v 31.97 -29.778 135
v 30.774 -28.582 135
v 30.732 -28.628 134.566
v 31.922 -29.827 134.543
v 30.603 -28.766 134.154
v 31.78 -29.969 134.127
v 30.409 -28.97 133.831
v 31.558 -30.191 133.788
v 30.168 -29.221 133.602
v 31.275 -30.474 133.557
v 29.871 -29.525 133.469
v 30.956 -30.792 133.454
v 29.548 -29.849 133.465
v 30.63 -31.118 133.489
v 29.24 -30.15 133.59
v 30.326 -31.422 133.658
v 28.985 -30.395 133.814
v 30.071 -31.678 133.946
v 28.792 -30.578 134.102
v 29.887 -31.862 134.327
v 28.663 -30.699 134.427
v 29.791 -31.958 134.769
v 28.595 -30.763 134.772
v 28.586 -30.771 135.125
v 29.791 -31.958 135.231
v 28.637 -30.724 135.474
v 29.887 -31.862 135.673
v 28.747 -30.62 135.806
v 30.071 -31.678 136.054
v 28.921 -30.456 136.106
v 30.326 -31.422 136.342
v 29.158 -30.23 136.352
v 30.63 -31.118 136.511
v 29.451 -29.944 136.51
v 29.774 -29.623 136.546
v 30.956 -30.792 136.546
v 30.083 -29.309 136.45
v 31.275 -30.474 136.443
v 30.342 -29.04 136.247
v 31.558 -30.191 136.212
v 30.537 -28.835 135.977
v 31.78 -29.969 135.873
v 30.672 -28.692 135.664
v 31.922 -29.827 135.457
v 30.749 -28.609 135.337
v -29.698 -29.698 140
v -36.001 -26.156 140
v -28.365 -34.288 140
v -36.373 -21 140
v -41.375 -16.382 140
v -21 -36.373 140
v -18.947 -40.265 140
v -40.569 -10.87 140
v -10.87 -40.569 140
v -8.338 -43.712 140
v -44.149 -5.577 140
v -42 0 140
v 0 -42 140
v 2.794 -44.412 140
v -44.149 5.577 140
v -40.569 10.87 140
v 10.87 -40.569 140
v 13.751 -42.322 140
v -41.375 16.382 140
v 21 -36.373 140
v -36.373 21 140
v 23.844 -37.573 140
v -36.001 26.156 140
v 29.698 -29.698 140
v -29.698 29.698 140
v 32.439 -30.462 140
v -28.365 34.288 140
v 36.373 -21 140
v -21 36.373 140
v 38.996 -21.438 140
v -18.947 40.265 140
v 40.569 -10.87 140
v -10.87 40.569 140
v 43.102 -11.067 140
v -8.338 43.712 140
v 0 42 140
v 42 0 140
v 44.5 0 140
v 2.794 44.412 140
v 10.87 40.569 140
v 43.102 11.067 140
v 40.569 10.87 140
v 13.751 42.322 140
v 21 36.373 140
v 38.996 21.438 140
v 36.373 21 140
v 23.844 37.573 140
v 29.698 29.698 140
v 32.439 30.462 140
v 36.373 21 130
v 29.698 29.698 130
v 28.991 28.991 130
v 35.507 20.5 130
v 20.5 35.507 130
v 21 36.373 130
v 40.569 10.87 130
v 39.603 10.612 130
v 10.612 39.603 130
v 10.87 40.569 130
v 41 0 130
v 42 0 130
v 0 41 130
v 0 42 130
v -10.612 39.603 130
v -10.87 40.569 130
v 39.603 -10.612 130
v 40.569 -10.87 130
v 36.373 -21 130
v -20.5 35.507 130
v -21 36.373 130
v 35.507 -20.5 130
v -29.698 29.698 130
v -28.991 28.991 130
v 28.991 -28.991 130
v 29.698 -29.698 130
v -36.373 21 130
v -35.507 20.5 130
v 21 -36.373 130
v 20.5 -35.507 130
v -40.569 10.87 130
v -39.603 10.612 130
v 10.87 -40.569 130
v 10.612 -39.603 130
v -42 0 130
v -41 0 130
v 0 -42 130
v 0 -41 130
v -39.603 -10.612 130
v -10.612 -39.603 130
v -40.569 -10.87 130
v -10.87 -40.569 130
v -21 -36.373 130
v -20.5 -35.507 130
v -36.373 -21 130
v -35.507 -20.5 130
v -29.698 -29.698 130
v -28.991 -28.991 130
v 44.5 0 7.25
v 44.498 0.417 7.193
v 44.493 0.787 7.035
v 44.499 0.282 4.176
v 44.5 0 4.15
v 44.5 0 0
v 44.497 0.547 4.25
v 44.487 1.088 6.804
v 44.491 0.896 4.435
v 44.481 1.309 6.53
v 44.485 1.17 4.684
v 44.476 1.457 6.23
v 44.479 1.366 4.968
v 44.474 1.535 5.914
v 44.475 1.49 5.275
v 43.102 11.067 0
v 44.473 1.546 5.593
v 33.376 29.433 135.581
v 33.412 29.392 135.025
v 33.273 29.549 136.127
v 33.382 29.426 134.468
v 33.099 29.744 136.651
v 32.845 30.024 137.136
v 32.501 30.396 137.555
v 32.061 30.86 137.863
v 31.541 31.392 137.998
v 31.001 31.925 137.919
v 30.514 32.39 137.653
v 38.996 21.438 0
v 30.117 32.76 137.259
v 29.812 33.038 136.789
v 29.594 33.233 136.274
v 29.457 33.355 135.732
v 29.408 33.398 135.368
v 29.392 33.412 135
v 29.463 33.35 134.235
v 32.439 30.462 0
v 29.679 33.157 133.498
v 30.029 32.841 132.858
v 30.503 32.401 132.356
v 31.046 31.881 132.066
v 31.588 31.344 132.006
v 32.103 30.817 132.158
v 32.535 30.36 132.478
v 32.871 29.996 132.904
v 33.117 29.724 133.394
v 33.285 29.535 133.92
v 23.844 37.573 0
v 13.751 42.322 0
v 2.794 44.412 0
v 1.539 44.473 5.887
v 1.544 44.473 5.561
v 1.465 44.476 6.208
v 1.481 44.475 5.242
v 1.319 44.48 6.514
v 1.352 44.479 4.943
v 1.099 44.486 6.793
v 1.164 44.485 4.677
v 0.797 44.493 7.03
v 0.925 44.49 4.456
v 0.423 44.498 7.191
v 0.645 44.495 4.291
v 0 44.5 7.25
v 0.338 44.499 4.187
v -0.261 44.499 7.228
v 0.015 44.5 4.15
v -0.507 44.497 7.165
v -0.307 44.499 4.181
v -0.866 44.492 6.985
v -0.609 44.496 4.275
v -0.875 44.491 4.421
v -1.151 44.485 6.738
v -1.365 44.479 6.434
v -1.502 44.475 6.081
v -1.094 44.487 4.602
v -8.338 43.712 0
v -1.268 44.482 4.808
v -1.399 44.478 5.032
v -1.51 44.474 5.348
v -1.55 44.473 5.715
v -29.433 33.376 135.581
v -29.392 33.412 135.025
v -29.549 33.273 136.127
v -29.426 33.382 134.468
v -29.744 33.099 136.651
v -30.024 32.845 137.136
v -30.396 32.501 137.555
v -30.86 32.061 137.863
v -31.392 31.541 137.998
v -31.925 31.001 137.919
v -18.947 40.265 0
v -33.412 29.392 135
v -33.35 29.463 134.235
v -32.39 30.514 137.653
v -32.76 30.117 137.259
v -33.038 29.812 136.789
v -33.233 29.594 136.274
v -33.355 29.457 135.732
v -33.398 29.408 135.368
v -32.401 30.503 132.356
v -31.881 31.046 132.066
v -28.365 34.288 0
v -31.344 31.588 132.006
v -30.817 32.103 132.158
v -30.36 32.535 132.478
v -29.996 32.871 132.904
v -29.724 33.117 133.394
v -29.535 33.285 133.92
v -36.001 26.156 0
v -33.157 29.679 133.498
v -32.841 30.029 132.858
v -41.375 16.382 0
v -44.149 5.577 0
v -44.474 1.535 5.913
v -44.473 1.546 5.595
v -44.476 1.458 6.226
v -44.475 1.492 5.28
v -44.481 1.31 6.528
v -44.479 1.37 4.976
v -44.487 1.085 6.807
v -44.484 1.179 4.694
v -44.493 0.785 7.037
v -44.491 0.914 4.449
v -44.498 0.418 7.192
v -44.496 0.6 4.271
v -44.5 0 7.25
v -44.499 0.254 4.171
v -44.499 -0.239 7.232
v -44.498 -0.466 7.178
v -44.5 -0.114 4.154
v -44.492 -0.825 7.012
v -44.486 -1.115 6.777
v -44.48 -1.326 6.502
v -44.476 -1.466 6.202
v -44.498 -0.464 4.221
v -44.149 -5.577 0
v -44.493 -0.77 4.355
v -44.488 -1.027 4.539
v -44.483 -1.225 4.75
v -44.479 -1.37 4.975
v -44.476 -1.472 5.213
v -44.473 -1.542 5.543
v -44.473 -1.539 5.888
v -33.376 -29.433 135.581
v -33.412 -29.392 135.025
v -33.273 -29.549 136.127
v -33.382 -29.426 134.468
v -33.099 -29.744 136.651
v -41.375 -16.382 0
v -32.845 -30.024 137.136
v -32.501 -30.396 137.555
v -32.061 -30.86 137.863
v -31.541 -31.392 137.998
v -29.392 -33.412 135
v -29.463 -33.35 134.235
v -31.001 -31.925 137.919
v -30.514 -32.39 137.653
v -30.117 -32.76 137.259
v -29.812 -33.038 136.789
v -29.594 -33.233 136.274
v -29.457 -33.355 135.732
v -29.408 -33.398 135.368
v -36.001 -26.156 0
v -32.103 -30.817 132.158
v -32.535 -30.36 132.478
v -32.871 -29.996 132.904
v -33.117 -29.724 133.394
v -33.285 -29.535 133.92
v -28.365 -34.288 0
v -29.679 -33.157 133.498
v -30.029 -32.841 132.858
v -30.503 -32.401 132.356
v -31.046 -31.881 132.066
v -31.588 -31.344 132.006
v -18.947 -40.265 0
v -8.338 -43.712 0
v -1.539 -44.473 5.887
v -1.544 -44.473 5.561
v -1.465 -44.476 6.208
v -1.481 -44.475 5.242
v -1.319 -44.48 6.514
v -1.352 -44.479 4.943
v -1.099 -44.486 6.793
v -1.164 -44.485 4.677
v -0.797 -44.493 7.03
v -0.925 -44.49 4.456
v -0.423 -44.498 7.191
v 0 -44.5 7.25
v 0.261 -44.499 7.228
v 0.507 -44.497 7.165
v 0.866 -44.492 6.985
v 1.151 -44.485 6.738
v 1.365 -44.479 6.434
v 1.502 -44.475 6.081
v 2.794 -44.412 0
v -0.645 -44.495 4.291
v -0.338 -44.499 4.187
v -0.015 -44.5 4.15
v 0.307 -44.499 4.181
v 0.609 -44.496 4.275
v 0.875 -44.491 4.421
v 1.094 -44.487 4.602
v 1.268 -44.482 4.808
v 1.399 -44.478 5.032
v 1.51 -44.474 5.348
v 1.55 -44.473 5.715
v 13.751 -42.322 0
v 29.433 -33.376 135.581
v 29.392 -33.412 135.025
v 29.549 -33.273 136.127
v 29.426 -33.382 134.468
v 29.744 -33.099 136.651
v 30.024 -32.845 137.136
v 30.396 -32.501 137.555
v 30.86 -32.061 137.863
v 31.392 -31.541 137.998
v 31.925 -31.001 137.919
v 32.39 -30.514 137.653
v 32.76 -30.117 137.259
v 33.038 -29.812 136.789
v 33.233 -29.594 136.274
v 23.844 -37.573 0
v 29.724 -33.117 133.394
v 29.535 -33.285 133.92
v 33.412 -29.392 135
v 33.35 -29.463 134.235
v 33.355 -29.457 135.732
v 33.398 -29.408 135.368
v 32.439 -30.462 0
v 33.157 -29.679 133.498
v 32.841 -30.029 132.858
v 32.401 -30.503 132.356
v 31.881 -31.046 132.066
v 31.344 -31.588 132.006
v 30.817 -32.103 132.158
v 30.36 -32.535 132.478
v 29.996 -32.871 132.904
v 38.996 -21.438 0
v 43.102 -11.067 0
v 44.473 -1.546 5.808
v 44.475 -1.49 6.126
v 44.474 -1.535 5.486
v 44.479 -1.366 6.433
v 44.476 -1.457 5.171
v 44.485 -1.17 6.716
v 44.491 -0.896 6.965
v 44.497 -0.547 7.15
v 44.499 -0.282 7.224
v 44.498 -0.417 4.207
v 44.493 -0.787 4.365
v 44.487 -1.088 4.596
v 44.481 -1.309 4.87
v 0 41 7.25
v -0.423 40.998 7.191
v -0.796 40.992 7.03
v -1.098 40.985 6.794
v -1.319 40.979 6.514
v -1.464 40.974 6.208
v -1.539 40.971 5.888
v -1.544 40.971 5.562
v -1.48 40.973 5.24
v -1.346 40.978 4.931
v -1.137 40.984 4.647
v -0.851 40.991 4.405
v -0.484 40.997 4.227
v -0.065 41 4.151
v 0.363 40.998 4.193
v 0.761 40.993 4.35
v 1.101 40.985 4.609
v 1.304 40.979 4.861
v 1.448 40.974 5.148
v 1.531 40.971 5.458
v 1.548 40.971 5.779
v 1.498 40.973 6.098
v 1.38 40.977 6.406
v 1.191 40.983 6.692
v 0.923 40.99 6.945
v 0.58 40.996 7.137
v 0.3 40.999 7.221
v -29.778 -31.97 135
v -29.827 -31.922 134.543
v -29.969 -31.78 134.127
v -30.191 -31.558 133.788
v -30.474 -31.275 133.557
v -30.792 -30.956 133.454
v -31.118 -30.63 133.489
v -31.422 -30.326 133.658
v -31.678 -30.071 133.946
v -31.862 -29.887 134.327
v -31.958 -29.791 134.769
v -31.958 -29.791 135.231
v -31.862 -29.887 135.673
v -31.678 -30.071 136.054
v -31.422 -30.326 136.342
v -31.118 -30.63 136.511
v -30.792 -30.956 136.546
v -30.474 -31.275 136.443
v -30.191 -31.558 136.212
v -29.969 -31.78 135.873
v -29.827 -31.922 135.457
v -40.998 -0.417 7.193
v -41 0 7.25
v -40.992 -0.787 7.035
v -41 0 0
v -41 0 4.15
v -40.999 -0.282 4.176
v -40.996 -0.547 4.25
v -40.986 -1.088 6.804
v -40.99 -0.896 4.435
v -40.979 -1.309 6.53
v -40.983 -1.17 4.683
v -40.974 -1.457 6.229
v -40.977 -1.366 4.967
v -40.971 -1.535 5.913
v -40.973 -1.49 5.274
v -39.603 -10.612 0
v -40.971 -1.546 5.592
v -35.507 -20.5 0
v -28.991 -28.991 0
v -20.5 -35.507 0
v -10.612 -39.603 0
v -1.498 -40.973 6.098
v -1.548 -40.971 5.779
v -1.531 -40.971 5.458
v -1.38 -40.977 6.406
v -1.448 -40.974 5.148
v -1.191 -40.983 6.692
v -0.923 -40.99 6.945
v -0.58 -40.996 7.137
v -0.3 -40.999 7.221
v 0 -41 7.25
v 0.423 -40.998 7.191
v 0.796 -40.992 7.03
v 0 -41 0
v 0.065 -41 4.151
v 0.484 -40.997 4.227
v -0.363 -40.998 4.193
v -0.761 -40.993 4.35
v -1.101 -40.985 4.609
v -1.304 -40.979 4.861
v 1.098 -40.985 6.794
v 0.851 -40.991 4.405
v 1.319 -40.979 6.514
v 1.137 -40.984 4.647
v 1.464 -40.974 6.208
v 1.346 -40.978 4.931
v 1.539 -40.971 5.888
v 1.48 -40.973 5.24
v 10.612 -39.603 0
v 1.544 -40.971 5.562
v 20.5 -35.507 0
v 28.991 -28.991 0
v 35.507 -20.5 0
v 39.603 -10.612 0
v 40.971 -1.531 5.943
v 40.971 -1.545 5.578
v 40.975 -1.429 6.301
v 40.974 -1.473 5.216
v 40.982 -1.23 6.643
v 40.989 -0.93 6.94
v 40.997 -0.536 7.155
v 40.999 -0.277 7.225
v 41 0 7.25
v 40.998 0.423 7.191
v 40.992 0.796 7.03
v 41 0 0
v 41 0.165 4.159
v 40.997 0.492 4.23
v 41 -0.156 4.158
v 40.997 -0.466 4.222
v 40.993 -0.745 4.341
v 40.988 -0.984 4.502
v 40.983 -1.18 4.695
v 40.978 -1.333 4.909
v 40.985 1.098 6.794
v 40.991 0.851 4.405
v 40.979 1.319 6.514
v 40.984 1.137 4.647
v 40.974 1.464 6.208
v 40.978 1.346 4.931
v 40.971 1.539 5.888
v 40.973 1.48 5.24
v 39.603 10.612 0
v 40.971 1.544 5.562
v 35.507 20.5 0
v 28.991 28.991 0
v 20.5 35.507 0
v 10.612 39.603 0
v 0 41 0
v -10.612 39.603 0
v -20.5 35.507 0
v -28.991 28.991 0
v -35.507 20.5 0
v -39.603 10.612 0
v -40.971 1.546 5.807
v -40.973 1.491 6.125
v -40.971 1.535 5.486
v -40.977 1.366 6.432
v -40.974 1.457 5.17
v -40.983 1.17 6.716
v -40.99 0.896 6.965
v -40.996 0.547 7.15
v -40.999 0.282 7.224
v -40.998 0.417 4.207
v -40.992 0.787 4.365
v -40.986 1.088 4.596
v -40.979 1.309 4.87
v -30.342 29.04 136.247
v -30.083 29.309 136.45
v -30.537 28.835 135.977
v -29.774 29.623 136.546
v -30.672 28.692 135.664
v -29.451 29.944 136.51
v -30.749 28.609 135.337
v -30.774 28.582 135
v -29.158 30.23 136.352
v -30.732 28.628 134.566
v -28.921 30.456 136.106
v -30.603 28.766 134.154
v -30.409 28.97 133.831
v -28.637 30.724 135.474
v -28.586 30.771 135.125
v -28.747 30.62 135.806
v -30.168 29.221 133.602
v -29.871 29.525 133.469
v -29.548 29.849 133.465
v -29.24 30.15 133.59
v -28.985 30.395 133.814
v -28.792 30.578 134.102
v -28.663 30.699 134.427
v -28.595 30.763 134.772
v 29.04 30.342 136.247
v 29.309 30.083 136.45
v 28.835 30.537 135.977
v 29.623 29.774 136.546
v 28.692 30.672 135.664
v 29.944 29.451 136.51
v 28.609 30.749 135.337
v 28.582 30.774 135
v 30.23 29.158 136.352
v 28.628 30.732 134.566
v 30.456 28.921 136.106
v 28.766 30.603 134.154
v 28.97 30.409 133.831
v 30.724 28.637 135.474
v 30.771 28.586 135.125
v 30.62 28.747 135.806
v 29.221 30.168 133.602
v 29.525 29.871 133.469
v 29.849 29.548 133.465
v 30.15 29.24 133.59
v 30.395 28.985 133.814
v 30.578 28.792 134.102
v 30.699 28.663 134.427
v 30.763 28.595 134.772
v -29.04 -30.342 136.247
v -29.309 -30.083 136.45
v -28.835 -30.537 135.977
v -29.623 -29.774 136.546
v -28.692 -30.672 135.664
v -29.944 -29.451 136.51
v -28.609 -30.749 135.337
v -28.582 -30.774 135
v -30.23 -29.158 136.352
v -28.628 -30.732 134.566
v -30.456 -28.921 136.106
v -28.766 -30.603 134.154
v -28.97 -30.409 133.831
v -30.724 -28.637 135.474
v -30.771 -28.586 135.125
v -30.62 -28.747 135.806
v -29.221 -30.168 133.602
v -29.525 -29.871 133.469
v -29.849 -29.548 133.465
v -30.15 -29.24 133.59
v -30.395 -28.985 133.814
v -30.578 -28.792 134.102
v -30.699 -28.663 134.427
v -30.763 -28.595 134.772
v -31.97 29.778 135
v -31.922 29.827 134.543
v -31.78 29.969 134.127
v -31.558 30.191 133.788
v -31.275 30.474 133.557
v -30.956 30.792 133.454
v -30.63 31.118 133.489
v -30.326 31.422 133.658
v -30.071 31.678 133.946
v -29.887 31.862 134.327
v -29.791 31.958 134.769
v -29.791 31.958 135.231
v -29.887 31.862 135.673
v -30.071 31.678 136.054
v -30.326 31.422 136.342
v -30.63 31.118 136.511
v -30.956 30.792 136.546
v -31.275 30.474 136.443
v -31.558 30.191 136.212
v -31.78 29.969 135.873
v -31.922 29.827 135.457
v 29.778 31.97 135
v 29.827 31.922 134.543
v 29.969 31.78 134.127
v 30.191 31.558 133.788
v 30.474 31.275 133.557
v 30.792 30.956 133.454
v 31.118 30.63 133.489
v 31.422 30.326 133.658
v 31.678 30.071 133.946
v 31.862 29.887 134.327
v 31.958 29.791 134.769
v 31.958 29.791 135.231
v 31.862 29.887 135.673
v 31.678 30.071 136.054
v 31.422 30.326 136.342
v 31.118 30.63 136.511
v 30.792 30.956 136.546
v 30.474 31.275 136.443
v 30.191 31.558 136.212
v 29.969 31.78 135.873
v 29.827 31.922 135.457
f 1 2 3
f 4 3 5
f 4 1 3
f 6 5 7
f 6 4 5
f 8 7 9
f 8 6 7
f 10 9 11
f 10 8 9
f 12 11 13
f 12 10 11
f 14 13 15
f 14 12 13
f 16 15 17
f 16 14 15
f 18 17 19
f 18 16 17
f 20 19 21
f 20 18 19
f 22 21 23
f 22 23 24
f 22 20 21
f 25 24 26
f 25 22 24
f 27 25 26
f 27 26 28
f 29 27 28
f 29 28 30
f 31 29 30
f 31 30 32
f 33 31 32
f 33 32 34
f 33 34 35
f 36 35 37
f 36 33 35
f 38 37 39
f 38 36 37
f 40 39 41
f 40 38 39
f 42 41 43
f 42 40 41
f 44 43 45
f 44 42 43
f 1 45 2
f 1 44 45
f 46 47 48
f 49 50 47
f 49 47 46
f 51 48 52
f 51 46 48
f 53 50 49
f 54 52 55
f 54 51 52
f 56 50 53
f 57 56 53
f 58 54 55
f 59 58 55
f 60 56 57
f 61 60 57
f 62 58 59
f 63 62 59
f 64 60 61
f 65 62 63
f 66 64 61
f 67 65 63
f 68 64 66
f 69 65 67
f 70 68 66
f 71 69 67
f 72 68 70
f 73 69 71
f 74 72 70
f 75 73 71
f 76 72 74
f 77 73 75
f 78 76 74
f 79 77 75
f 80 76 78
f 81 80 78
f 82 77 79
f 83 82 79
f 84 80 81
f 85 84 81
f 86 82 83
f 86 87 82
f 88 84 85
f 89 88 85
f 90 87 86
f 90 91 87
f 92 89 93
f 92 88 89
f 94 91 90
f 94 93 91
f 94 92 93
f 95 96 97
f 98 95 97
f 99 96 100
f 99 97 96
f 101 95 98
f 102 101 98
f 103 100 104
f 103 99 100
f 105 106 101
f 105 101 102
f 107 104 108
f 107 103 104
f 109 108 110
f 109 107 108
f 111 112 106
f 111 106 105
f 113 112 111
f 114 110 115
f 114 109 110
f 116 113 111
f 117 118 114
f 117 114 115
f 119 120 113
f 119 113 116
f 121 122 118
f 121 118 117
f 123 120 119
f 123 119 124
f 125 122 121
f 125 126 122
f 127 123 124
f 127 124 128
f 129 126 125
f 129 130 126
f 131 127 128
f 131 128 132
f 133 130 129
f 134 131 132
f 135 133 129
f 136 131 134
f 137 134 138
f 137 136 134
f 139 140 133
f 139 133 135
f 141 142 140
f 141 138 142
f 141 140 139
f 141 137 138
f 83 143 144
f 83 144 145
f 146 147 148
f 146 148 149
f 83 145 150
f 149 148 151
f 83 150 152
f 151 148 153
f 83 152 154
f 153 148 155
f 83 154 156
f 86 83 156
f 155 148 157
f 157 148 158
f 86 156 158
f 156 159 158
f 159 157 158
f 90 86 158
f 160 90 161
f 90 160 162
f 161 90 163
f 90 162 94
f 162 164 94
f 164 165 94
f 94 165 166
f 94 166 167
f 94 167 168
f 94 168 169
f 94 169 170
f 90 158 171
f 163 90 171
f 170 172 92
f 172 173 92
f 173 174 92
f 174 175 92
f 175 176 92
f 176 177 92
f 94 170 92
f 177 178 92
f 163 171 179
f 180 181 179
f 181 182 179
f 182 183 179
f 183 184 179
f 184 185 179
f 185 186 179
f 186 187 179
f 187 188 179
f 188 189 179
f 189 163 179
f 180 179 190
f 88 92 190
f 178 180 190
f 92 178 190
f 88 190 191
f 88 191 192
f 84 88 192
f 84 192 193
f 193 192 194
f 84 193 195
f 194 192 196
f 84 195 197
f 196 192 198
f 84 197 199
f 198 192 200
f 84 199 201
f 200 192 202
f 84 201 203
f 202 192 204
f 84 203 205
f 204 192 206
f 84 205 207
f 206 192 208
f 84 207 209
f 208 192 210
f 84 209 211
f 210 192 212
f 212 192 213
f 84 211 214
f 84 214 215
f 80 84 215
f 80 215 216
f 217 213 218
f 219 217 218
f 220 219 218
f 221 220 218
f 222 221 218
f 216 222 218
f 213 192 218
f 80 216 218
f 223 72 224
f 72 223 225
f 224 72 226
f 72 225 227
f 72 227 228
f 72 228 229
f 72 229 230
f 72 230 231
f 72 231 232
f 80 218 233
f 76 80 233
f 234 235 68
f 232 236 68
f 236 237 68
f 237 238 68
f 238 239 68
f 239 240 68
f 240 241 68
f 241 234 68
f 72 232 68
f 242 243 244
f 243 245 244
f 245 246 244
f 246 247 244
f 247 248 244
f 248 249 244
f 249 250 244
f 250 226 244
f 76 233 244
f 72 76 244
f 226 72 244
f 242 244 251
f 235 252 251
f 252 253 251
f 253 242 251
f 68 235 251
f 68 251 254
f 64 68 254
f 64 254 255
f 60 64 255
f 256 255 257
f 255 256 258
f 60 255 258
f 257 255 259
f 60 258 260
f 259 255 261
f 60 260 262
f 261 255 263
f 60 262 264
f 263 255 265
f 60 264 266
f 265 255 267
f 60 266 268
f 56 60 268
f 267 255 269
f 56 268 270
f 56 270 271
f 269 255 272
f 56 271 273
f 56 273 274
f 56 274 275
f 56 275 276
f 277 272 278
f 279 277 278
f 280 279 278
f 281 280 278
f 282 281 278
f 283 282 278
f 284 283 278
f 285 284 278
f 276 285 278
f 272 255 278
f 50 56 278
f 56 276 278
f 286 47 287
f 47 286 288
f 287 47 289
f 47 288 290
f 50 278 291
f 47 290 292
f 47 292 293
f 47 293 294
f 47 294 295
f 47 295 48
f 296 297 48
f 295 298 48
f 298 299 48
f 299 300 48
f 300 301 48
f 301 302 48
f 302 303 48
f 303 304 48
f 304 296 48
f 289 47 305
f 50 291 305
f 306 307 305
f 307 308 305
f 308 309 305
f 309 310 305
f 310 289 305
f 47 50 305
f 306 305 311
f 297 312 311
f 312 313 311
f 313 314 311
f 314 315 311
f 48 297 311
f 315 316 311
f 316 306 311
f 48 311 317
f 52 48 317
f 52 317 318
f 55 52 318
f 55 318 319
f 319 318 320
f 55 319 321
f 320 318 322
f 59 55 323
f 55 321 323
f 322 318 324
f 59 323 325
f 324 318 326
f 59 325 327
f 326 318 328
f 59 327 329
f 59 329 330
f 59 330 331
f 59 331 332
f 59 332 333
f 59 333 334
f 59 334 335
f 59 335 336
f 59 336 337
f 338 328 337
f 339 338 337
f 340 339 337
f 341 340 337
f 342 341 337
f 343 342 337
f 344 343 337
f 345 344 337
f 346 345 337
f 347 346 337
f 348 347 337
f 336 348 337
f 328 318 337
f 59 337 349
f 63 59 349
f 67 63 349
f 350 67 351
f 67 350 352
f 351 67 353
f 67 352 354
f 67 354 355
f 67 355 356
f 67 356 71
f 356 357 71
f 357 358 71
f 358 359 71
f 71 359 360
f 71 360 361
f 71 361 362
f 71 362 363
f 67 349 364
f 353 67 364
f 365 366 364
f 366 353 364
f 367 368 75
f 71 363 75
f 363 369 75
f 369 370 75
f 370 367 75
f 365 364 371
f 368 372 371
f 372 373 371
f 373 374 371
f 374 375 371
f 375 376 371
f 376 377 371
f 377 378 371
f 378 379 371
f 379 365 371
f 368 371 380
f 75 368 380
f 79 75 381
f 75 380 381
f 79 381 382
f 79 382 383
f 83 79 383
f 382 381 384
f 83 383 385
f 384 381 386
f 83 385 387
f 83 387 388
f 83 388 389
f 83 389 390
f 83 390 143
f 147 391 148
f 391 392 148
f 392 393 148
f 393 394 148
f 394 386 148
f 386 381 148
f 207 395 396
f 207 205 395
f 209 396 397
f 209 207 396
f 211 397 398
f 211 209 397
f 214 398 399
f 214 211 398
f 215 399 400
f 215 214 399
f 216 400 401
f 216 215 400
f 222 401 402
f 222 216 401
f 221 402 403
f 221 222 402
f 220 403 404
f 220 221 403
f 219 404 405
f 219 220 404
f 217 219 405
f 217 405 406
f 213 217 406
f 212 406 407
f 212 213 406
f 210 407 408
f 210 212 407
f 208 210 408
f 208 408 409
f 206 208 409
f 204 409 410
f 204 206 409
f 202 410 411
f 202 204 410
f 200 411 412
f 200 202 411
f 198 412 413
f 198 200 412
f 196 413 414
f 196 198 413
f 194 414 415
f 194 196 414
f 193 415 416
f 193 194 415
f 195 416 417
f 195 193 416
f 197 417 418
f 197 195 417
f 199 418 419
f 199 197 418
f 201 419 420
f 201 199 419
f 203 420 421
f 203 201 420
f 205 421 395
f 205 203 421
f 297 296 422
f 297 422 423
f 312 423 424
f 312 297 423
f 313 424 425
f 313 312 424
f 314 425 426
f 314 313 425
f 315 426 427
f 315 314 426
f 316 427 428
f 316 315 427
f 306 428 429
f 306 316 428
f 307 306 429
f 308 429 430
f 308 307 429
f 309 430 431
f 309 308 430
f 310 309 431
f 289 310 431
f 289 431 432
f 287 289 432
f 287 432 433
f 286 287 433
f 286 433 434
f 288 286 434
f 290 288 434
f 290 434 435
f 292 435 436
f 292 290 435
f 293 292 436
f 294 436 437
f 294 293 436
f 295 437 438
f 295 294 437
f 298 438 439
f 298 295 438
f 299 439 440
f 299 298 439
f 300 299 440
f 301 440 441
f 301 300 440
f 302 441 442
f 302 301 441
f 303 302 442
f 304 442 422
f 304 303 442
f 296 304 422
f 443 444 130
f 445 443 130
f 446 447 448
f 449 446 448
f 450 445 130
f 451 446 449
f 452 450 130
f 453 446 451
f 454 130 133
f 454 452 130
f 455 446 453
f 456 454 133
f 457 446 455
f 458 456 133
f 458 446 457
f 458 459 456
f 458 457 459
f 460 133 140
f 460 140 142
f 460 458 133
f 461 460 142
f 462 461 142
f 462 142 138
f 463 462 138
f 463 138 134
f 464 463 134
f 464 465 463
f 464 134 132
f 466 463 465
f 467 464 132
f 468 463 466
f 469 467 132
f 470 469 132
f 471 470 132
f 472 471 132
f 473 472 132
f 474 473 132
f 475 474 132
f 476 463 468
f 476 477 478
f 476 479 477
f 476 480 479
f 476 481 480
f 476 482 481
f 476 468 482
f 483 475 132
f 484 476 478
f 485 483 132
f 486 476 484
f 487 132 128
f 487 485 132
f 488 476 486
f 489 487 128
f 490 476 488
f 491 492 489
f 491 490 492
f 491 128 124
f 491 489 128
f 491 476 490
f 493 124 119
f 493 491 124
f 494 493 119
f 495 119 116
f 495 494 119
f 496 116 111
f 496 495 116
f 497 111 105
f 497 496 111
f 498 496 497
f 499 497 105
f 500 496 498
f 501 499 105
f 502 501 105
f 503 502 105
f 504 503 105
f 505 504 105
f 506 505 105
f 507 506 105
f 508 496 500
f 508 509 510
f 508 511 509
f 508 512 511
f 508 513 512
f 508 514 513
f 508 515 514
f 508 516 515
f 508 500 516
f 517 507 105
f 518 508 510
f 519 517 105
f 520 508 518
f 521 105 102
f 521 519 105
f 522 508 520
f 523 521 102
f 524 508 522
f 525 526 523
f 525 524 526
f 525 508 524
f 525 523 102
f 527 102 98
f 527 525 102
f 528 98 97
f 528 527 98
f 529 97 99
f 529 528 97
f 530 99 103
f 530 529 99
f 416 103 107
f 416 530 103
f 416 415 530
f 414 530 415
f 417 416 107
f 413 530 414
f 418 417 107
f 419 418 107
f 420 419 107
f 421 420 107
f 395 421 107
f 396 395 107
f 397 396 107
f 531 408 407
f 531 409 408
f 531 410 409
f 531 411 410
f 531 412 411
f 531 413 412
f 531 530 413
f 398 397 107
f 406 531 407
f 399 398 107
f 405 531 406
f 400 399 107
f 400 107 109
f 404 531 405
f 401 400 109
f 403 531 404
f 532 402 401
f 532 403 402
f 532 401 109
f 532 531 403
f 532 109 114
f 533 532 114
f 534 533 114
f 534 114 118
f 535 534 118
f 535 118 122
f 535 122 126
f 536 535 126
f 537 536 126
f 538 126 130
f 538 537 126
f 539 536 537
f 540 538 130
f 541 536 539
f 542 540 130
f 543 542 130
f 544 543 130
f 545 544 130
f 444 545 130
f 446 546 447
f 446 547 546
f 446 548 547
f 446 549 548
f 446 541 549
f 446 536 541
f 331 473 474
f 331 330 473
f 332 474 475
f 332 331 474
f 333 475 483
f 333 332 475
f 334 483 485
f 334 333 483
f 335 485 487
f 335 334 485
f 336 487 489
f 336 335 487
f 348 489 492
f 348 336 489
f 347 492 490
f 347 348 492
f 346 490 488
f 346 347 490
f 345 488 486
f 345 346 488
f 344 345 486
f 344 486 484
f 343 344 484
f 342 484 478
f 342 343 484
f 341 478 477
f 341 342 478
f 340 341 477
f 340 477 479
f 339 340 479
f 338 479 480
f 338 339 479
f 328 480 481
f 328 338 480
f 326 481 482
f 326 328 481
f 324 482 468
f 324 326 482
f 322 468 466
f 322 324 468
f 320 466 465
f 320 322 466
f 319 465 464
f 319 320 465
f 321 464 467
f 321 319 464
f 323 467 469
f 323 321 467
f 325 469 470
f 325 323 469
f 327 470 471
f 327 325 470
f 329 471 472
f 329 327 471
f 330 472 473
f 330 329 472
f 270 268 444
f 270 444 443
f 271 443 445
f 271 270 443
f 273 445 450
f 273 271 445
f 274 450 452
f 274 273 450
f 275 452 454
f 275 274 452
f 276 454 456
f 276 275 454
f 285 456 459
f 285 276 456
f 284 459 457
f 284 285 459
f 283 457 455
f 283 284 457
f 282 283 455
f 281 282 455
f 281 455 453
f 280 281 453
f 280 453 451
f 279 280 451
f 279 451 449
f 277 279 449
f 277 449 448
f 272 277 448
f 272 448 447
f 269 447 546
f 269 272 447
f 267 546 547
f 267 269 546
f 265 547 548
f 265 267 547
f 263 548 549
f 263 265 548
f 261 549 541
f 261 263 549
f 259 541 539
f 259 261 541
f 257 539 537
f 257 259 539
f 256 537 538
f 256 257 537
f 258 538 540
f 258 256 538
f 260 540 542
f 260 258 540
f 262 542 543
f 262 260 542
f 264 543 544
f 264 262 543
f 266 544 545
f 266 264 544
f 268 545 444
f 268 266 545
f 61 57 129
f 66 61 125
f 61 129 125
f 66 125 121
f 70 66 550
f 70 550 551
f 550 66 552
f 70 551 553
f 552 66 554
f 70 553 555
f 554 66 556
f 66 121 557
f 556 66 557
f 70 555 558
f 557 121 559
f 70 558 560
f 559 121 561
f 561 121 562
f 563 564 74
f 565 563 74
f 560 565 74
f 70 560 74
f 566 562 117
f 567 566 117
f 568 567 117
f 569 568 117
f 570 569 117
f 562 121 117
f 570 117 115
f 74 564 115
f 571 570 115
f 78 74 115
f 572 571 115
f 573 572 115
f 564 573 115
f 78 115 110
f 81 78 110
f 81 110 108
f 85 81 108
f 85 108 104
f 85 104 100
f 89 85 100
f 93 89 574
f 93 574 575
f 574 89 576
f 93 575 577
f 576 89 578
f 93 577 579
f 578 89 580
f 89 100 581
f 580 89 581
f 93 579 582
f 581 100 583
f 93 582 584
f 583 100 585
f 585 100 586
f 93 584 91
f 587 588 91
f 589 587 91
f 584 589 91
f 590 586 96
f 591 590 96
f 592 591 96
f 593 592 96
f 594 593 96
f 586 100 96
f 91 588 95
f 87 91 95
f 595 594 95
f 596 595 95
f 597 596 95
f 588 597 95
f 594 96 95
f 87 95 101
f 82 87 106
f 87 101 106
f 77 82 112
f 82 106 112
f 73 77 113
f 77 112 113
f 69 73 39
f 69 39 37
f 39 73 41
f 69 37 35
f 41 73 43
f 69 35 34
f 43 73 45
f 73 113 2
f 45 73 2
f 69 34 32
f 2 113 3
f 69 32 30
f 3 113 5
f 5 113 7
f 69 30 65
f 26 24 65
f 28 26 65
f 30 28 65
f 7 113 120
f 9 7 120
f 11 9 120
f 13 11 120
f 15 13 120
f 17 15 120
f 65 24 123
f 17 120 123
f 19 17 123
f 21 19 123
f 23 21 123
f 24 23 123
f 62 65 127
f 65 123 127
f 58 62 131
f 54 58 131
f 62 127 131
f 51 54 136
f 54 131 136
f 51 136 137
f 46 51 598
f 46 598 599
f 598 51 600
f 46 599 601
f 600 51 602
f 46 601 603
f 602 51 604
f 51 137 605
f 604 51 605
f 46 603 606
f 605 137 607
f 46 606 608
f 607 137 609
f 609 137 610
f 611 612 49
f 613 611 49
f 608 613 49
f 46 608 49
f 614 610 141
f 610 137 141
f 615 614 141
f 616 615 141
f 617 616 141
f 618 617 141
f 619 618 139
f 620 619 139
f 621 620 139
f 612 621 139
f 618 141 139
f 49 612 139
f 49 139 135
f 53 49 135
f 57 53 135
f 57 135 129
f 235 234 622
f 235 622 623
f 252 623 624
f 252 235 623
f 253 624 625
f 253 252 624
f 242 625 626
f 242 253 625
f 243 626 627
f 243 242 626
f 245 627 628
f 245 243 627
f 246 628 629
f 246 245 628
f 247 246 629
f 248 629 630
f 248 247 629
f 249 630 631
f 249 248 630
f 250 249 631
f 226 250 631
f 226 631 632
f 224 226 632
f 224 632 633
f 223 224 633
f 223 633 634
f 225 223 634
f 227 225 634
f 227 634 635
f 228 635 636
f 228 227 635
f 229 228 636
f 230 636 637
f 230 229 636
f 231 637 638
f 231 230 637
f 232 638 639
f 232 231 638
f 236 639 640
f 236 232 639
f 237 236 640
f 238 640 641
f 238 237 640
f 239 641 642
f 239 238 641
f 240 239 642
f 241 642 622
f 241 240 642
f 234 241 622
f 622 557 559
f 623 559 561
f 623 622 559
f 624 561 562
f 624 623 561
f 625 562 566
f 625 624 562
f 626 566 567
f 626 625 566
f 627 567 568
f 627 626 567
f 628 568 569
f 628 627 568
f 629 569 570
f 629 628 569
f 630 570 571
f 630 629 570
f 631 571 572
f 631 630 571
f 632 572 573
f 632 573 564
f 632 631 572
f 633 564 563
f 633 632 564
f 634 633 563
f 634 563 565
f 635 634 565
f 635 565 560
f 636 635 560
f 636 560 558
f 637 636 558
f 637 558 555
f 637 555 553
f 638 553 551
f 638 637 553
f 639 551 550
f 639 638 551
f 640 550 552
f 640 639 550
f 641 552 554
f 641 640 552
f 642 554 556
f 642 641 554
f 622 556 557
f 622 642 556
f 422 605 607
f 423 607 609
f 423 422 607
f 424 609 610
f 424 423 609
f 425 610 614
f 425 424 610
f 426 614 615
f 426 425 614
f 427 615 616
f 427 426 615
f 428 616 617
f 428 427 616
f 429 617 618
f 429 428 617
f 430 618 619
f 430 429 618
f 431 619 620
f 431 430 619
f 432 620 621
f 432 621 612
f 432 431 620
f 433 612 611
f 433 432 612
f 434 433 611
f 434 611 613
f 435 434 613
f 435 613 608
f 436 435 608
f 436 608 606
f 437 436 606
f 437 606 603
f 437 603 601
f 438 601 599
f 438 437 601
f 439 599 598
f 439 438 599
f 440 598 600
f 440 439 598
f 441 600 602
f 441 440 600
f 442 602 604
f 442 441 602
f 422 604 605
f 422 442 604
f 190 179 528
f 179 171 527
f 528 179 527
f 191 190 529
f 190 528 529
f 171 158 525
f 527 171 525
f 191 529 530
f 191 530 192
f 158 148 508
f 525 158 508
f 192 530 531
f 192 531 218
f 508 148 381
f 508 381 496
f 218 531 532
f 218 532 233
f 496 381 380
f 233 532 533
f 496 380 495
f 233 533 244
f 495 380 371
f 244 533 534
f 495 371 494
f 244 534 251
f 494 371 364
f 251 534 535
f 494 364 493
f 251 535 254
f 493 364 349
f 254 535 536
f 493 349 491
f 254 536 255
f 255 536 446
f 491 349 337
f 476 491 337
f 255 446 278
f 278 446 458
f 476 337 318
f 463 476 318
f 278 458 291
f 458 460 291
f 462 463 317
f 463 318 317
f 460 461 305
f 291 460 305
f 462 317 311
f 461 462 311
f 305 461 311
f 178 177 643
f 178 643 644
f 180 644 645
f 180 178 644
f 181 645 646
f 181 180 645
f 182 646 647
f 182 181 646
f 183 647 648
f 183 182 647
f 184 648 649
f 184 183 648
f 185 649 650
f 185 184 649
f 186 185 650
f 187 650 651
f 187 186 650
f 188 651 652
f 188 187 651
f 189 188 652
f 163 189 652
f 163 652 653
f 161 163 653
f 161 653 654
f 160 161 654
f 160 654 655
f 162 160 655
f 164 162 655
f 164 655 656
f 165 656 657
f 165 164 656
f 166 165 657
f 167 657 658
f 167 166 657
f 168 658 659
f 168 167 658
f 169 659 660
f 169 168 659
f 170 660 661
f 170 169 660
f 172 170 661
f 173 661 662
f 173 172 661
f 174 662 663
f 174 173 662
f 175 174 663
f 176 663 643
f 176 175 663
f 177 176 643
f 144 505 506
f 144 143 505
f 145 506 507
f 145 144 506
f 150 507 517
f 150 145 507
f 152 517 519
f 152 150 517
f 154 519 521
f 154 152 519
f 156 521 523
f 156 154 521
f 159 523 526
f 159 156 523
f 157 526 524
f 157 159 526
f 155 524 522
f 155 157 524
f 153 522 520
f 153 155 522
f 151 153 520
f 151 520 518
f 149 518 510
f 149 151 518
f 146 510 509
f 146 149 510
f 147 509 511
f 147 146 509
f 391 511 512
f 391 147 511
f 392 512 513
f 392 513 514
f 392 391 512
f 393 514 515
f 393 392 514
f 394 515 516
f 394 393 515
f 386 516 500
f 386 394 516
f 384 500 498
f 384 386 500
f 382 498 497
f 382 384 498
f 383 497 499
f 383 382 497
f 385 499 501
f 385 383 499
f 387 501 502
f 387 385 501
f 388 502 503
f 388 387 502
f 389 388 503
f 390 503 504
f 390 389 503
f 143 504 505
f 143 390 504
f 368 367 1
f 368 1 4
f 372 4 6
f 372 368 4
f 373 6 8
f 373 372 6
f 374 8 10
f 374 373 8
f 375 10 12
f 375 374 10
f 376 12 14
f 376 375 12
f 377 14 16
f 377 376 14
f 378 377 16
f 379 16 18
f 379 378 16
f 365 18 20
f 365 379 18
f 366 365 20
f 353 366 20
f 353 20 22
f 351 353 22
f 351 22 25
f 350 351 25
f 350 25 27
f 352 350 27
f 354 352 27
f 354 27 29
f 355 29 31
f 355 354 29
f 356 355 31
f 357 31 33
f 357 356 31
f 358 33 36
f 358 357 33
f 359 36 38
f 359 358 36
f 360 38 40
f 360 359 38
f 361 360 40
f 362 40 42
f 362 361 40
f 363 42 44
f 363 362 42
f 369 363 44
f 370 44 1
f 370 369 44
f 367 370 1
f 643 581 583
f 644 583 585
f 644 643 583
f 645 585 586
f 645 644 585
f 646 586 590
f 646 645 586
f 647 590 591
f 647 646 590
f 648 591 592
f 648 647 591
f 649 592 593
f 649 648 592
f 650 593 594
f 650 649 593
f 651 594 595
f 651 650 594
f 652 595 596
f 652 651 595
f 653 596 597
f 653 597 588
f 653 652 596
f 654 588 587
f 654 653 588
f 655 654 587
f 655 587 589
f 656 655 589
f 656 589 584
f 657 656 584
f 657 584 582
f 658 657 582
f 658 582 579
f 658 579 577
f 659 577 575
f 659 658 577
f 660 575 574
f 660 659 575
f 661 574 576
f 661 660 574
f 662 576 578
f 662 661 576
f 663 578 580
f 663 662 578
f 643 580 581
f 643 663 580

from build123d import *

# Parameters (mm, degrees)
ESQUISSE1_R                  = 44.5
BOSS_EXTRU_1_DEPTH           = 140
ESQUISSE2_R                  = 42
ENL_V_MAT_EXTRU_1_DEPTH      = 150
R_P_TITION_CIRCULAIRE1_COUNT = 4
ESQUISSE8_W                  = 1
ESQUISSE8_H                  = 130
R_P_TITION_CIRCULAIRE2_COUNT = 4


with BuildPart() as part:
    # Esquisse1 → Boss.-Extru.1 (new body)
    with BuildSketch(Plane.XY):
        Circle(ESQUISSE1_R)
    extrude(amount=BOSS_EXTRU_1_DEPTH)

    # Esquisse2 → Enlèv. mat.-Extru.1 (cut)
    with BuildSketch(Plane(origin=(0, 0, 0), x_dir=(-1, 0, 0), z_dir=(0, 0, -1))):
        Circle(ESQUISSE2_R)
    extrude(amount=-ENL_V_MAT_EXTRU_1_DEPTH, mode=Mode.SUBTRACT)

    # Esquisse5 → Dégagement M2.51 (revolve, cut)
    with BuildSketch(Plane(origin=(-31.466251763, 31.466251763, 135), x_dir=(-0.707106781, -0.707106781, 0), z_dir=(0, 0, 1))):
        Polygon((0, 0), (0, 15.931333959), (1.55, 15), (1.55, 0.83715789), (3, 0), align=None)
    d_gagement_m2_51 = revolve(axis=Axis((-35.956379823, 35.956379823, 135), (0.707106781, -0.707106781, 0)), mode=Mode.SUBTRACT)

    # Répétition circulaire1: Dégagement M2.51 ×4 about axis
    r_p_tition_circulaire1_axis = Axis((0, 0, 150), (0, 0, -1))
    for i in range(1, R_P_TITION_CIRCULAIRE1_COUNT):
        add(d_gagement_m2_51.rotate(r_p_tition_circulaire1_axis, i * 360 / R_P_TITION_CIRCULAIRE1_COUNT), mode=Mode.SUBTRACT)

    # Esquisse8 → Révolution1 (revolve)
    with BuildSketch(Plane(origin=(0, 0, 0), x_dir=(1, 0, 0), z_dir=(0, 1, 0))):
        with Locations((-41.5, -65)):
            Rectangle(ESQUISSE8_W, ESQUISSE8_H)
    revolve(axis=Axis((0, 0, -17.420915561), (0, 0, 1)))

    # Esquisse7 → Dégagement M2.52 (revolve, cut)
    with BuildSketch(Plane(origin=(-44.5, 0, 5.7), x_dir=(0, 0, 1), z_dir=(0, 1, 0))):
        Polygon((0, 0), (0, 20.931333959), (1.55, 20), (1.55, 0), align=None)
    d_gagement_m2_52 = revolve(axis=Axis((-50.85, 0, 5.7), (1, 0, 0)), mode=Mode.SUBTRACT)

    # Répétition circulaire2: Dégagement M2.52 ×4 about axis
    r_p_tition_circulaire2_axis = Axis((0, 0, 0), (0, 0, 1))
    for i in range(1, R_P_TITION_CIRCULAIRE2_COUNT):
        add(d_gagement_m2_52.rotate(r_p_tition_circulaire2_axis, i * 360 / R_P_TITION_CIRCULAIRE2_COUNT), mode=Mode.SUBTRACT)


solid = part.part
